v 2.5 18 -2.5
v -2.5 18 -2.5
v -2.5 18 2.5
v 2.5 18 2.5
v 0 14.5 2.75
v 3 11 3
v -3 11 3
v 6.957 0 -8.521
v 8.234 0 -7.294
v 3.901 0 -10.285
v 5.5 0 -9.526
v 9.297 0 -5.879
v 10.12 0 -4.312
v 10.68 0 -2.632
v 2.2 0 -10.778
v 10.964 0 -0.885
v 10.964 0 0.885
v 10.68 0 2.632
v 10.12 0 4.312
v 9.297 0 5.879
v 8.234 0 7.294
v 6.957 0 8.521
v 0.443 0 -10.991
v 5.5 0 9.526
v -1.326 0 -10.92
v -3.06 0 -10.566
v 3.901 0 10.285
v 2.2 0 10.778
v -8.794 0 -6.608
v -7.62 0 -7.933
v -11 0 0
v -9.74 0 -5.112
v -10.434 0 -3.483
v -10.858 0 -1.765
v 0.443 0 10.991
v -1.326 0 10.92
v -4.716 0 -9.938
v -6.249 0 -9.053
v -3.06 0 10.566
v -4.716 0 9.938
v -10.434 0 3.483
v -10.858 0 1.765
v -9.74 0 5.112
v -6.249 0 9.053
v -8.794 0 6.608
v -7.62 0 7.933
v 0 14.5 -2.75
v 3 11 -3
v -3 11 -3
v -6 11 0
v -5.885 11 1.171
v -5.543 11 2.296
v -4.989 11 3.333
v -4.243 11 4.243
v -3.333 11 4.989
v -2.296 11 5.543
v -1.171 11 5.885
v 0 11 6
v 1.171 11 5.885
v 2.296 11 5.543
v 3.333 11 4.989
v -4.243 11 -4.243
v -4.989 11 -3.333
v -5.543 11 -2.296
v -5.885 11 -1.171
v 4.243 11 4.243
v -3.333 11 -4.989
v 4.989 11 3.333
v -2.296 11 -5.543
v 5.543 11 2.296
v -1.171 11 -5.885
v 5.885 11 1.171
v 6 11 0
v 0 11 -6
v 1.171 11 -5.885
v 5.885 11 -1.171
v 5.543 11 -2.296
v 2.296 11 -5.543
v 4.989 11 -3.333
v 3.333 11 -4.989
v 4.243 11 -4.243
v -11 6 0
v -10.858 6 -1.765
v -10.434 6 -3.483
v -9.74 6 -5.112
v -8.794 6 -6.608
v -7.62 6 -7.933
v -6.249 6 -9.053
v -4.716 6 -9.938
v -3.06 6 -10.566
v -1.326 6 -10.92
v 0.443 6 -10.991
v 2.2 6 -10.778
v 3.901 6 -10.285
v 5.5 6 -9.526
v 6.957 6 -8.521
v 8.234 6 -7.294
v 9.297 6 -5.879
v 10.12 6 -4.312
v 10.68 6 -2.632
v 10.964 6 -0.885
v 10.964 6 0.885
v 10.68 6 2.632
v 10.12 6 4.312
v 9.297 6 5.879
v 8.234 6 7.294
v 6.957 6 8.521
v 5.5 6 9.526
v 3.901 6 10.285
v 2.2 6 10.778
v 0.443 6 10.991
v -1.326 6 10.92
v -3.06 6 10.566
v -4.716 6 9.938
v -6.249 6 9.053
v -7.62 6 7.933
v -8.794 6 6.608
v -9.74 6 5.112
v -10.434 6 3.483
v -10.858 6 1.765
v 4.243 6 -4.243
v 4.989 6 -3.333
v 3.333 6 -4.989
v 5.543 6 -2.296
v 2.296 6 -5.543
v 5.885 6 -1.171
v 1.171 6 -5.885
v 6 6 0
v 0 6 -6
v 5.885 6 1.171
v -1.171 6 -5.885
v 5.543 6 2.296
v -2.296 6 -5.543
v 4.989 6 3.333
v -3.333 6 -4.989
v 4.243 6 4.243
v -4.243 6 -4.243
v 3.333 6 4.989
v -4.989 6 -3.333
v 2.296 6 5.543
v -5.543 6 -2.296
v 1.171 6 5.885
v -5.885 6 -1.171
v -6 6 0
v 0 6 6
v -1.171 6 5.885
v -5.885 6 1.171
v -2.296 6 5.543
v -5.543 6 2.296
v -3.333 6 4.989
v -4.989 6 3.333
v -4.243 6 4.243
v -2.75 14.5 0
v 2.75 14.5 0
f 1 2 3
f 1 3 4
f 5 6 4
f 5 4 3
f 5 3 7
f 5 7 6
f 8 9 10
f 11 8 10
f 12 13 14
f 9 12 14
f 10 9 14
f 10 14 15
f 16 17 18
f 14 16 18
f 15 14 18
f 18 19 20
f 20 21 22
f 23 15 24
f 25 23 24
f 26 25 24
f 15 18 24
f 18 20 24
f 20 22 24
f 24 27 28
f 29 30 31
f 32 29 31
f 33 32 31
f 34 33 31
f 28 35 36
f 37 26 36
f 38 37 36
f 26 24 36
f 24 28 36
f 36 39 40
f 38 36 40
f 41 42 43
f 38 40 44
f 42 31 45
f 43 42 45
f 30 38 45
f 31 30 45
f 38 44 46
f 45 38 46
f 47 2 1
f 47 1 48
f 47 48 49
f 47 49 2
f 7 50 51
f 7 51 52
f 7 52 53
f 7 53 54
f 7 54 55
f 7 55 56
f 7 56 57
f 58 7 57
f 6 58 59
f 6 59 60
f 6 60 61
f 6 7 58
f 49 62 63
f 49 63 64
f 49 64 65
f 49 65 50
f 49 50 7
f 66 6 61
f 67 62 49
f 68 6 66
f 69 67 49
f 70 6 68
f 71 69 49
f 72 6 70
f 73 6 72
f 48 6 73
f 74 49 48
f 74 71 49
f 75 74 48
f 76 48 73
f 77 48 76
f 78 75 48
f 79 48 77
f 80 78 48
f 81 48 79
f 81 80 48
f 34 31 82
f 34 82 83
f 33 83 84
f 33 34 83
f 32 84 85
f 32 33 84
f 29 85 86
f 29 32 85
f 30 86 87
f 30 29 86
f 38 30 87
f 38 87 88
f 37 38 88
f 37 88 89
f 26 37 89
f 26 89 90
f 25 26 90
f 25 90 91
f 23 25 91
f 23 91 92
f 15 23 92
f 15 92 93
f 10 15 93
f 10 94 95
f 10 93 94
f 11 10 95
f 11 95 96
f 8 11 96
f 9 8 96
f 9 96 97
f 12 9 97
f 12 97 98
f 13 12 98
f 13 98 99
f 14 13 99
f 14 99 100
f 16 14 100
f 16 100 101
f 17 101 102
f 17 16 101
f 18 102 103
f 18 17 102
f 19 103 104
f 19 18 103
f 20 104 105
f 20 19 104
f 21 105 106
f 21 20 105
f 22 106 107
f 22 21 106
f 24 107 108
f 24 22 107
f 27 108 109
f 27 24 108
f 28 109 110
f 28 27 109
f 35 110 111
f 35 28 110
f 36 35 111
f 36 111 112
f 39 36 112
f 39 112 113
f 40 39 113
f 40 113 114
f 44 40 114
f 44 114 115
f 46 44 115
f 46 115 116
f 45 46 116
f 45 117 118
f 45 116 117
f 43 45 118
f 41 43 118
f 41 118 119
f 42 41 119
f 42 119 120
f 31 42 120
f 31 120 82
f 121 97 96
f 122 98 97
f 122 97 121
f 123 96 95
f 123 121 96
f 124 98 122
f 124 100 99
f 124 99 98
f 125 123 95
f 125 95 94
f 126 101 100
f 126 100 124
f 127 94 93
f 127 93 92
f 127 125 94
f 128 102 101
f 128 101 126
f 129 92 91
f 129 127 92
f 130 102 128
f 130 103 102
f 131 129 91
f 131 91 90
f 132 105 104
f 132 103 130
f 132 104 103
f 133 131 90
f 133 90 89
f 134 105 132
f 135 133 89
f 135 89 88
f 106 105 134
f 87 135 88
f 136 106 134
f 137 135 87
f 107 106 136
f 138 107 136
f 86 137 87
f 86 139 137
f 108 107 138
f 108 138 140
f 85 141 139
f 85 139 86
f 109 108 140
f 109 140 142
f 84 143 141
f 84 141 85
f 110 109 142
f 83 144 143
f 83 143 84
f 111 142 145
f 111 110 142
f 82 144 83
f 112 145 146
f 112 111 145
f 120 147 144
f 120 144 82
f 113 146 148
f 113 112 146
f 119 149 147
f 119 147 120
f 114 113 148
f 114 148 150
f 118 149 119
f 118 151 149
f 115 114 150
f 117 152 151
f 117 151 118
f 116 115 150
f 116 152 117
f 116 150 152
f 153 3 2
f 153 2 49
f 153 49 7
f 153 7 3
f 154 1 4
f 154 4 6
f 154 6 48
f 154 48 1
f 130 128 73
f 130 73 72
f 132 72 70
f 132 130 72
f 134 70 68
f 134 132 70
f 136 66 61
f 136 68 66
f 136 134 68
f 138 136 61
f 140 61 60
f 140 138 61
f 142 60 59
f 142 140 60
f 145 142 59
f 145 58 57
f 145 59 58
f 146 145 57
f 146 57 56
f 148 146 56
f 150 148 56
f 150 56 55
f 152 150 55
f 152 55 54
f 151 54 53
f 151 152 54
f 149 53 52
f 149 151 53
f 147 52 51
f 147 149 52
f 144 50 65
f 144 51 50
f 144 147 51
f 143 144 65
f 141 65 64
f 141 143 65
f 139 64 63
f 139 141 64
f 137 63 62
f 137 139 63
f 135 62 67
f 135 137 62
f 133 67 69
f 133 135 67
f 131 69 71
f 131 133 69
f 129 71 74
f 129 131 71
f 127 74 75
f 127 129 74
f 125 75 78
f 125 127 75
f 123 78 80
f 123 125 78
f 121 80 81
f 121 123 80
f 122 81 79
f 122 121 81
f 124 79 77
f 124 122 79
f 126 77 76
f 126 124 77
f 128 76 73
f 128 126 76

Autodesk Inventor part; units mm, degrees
ref_plane "YZ Plane" through (0, 0, 0) normal (1, 0, 0) x (0, 1, 0)
ref_plane "XZ Plane" through (0, 0, 0) normal (0, 1, 0) x (-1, 0, 0)
sketch "Sketch1" plane through (0, 0, 0) normal (0, 1, 0) x (-1, 0, 0)
  circle A0 centre (0, 0) radius 11
  dimension "d0" = 22
extrude "Extrusion1" add sketch "Sketch1" along normal blind 6
sketch "Sketch2" plane through (0, 6, 0) normal (0, 1, 0) x (1, 0, 0)
  circle A0 centre (0, 0) radius 6
  dimension "d3" = 12
extrude "Extrusion2" add sketch "Sketch2" along normal blind 5
sketch "Sketch3" plane through (0, 11, 0) normal (0, 1, 0) x (1, 0, 0)
  line L0 (-3, -3) -> (3, -3)
  line L1 (3, -3) -> (3, 3)
  line L2 (3, 3) -> (-3, 3)
  line L3 (-3, 3) -> (-3, -3)
  point P0 (0, 0)
  dimension "d6" = 6
  dimension "d7" = 6
ref_plane "Work Plane1" through (0, 18, 0) normal (0, 1, 0) x (1, 0, 0)
sketch "Sketch4" plane through (0, 18, 0) normal (0, 1, 0) x (1, 0, 0)
  line L0 (-2.5, -2.5) -> (2.5, -2.5)
  line L1 (2.5, -2.5) -> (2.5, 2.5)
  line L2 (2.5, 2.5) -> (-2.5, 2.5)
  line L3 (-2.5, 2.5) -> (-2.5, -2.5)
  point P0 (0, 0)
  dimension "d9" = 5
  dimension "d10" = 5
loft "Loft1" add profiles "Sketch3", "Sketch4"
properties part number "Driveshaft coupling end"
